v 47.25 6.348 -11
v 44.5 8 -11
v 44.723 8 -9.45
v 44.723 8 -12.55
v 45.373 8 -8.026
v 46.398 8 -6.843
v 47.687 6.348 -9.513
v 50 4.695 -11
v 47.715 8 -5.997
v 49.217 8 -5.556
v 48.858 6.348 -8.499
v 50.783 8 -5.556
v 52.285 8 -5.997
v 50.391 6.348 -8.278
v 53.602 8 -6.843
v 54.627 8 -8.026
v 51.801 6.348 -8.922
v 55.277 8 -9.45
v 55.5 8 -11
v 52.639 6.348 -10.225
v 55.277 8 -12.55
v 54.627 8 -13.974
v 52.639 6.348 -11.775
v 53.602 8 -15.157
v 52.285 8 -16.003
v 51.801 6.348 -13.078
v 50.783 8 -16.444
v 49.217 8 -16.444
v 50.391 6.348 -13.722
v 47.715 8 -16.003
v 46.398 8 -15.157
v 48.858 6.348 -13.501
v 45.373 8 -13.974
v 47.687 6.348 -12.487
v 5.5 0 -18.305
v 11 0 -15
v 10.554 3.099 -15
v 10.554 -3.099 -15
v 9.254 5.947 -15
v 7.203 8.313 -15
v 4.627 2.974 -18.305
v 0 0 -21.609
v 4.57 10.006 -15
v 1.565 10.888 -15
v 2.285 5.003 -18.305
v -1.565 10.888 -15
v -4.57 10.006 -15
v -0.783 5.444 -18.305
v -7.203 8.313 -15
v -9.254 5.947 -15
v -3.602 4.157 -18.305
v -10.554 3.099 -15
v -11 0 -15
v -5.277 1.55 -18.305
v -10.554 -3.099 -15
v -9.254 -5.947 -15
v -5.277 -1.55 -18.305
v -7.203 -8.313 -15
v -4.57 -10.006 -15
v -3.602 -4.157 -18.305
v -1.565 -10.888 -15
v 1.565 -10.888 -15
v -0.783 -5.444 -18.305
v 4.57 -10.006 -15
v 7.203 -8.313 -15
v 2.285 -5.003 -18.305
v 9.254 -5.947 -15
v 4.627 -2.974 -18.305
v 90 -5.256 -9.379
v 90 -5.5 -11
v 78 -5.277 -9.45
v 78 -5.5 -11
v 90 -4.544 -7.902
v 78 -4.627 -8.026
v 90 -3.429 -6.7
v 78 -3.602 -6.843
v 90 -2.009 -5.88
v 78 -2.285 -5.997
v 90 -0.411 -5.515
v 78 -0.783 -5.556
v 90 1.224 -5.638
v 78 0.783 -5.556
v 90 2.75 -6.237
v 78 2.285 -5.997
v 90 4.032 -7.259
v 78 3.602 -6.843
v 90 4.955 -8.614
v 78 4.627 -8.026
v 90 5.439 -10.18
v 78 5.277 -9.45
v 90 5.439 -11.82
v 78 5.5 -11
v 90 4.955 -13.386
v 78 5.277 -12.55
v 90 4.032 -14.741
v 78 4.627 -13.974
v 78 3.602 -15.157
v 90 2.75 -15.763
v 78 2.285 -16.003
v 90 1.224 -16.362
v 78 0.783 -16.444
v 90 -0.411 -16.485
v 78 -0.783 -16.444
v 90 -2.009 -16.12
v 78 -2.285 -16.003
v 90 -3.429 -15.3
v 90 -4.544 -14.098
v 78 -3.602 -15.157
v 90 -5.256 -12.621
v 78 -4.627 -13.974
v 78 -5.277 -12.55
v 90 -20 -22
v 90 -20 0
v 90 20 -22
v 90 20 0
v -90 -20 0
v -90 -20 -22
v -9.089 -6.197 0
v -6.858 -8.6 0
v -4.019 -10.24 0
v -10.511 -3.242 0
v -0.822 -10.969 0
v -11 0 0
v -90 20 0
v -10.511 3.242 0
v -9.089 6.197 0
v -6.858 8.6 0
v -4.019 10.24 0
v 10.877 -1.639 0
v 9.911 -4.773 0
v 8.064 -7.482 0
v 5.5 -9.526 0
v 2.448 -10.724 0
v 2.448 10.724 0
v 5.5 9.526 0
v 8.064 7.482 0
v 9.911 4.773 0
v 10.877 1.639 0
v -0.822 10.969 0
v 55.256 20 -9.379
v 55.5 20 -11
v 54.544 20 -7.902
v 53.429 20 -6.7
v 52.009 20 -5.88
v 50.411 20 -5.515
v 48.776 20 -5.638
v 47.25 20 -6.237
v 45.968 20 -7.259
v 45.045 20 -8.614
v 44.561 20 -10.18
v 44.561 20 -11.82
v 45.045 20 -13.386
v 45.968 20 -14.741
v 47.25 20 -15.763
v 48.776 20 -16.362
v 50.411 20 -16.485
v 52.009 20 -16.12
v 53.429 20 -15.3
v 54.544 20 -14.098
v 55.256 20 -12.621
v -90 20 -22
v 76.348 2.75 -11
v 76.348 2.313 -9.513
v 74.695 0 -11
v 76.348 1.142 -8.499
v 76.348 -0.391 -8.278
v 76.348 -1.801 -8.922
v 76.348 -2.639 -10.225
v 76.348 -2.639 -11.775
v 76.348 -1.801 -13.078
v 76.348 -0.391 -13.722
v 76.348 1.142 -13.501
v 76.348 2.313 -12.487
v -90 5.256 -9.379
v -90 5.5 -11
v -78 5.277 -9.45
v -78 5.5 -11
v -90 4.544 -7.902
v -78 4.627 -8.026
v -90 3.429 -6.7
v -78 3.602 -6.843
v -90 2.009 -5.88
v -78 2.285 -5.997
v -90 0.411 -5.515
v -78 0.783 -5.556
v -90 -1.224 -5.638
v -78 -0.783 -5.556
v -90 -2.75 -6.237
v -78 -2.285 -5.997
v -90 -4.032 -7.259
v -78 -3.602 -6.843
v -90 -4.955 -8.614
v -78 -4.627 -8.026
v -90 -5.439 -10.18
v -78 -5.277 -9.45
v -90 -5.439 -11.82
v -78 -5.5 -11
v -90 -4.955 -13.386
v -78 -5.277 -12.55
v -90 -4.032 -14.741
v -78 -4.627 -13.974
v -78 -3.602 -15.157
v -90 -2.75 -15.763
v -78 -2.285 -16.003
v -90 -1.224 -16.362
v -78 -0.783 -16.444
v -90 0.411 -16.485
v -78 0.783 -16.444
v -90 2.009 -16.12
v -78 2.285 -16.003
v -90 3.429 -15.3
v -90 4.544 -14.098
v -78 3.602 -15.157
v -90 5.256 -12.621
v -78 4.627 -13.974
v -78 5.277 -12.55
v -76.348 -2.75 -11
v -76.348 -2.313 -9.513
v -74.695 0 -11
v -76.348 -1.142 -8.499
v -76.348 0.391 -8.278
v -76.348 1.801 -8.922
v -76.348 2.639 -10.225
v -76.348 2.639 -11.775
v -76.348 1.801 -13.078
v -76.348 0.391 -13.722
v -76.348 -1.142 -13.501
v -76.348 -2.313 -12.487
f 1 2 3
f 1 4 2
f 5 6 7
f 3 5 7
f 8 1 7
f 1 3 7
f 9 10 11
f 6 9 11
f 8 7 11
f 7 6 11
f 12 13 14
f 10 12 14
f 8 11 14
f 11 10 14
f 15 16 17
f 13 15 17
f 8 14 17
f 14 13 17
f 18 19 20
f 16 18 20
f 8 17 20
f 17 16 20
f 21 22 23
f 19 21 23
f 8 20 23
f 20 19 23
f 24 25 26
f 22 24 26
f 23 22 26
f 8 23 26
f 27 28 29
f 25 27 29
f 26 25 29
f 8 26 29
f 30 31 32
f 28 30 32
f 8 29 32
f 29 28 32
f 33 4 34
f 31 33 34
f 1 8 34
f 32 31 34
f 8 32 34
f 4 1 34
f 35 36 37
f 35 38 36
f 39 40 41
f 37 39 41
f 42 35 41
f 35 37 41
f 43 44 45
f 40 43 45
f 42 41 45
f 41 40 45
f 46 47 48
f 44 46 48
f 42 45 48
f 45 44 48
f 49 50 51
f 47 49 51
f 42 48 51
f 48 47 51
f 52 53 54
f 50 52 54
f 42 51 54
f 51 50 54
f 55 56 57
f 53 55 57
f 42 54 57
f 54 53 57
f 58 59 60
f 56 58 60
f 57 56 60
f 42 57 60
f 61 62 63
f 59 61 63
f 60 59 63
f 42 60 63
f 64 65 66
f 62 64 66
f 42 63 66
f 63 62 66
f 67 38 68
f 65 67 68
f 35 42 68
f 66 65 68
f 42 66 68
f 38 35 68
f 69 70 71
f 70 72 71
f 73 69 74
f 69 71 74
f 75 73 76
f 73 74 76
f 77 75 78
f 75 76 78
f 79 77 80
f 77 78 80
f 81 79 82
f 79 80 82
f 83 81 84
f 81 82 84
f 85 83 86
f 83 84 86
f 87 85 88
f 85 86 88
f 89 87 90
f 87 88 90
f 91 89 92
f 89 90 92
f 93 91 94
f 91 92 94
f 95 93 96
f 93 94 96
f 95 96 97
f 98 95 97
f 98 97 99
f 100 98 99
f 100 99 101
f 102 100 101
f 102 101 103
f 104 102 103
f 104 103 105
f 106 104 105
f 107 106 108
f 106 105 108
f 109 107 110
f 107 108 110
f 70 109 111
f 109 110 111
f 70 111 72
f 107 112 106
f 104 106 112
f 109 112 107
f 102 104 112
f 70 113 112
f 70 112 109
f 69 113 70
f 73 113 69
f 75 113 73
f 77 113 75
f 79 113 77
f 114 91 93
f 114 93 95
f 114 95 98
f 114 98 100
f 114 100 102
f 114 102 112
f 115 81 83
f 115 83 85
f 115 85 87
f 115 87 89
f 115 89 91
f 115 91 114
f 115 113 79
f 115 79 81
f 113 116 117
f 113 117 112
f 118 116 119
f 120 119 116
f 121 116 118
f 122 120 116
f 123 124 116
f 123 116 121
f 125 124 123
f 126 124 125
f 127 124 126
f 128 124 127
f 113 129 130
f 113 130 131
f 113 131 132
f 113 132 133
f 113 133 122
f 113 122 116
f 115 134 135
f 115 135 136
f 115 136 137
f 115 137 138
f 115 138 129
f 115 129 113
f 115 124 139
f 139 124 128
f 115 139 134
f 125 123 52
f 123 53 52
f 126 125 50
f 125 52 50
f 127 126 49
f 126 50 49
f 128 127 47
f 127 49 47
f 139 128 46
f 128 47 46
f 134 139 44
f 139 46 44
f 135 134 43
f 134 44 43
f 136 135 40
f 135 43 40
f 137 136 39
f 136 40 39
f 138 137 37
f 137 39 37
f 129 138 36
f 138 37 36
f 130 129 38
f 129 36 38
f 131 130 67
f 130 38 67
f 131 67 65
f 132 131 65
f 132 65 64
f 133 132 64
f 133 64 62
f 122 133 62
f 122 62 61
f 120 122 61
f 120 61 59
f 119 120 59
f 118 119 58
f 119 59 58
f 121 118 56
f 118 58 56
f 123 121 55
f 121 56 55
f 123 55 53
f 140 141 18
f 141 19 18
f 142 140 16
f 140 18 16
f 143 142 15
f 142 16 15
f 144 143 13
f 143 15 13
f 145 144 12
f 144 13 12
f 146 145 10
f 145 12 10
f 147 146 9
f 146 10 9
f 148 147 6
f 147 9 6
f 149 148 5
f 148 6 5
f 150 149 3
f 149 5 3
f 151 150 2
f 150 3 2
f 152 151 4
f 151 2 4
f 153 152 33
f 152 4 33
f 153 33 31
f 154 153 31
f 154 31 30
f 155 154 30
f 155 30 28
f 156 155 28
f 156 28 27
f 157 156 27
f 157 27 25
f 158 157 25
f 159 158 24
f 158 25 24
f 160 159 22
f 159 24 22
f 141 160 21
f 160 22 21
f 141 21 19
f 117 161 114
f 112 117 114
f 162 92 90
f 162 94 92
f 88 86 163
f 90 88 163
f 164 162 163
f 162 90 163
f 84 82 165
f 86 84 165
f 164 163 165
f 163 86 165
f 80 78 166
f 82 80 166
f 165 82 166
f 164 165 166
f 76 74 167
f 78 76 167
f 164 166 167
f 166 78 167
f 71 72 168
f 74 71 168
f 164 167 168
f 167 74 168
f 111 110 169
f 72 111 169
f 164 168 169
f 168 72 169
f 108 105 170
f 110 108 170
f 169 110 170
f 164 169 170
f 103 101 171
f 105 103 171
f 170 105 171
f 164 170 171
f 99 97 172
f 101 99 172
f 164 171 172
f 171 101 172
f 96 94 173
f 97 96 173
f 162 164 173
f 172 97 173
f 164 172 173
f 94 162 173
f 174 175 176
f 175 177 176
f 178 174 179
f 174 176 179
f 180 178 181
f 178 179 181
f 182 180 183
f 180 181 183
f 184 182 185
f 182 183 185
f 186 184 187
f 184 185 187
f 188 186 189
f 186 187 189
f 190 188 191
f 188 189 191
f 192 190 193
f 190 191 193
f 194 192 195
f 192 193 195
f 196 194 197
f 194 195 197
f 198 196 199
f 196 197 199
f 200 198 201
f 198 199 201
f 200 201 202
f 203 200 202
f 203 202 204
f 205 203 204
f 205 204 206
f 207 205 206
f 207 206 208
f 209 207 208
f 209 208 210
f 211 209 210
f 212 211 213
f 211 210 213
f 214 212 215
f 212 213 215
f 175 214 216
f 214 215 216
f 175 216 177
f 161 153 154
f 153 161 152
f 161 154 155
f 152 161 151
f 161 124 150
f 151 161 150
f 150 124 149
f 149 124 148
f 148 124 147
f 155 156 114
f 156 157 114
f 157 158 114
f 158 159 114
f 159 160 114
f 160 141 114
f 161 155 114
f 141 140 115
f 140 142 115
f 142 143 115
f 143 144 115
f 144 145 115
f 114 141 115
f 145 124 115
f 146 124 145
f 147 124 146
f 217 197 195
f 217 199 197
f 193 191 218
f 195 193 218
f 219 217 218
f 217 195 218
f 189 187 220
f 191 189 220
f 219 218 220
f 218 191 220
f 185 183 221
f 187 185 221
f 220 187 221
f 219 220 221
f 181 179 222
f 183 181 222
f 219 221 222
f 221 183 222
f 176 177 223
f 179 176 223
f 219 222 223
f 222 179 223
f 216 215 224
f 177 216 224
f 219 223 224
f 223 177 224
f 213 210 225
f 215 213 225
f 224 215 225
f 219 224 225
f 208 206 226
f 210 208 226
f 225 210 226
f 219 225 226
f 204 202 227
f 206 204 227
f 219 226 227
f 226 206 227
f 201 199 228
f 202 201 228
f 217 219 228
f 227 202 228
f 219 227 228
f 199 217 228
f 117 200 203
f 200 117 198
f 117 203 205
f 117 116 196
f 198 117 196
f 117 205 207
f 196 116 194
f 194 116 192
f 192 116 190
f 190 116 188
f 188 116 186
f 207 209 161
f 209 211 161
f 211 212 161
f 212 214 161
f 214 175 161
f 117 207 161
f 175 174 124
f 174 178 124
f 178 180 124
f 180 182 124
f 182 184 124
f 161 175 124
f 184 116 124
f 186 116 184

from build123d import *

# Parameters (mm, degrees)
F0_W     = 180
F0_H     = 40
F1_DEPTH = 22
F3_D     = 22
F3_DEPTH = 15
F3_TIP   = 6.6094668093
F5_D     = 11
F5_DEPTH = 12
F5_TIP   = 3.3047334047
F7_D     = 11
F7_DEPTH = 12
F7_TIP   = 3.3047334047
F9_D     = 11
F9_DEPTH = 12
F9_TIP   = 3.3047334047


with BuildPart() as f1:
    # F0 (on Top) → F1 (new body)
    with BuildSketch(Plane.XY):
        Rectangle(F0_W, F0_H)
    extrude(amount=-F1_DEPTH)

    # F3
    with Locations(Plane.XY):
        with Locations((0, 0)):
            Hole(F3_D / 2, depth=F3_DEPTH)
            with Locations((0, 0, -(F3_DEPTH + F3_TIP / 2))):  # 118° drill point
                Cone(0, F3_D / 2, F3_TIP, mode=Mode.SUBTRACT)

    # F5
    with Locations(Plane(origin=(-90, 0, 0), x_dir=(0, -1, 0), z_dir=(-1, 0, 0))):
        with Locations((0, -11)):
            Hole(F5_D / 2, depth=F5_DEPTH)
            with Locations((0, 0, -(F5_DEPTH + F5_TIP / 2))):  # 118° drill point
                Cone(0, F5_D / 2, F5_TIP, mode=Mode.SUBTRACT)

    # F7
    with Locations(Plane.YZ.offset(90)):
        with Locations((0, -11)):
            Hole(F7_D / 2, depth=F7_DEPTH)
            with Locations((0, 0, -(F7_DEPTH + F7_TIP / 2))):  # 118° drill point
                Cone(0, F7_D / 2, F7_TIP, mode=Mode.SUBTRACT)

    # F9
    with Locations(Plane(origin=(0, 20, 0), x_dir=(-1, 0, 0), z_dir=(0, 1, 0))):
        with Locations((-50, -11)):
            Hole(F9_D / 2, depth=F9_DEPTH)
            with Locations((0, 0, -(F9_DEPTH + F9_TIP / 2))):  # 118° drill point
                Cone(0, F9_D / 2, F9_TIP, mode=Mode.SUBTRACT)


solid = f1.part
